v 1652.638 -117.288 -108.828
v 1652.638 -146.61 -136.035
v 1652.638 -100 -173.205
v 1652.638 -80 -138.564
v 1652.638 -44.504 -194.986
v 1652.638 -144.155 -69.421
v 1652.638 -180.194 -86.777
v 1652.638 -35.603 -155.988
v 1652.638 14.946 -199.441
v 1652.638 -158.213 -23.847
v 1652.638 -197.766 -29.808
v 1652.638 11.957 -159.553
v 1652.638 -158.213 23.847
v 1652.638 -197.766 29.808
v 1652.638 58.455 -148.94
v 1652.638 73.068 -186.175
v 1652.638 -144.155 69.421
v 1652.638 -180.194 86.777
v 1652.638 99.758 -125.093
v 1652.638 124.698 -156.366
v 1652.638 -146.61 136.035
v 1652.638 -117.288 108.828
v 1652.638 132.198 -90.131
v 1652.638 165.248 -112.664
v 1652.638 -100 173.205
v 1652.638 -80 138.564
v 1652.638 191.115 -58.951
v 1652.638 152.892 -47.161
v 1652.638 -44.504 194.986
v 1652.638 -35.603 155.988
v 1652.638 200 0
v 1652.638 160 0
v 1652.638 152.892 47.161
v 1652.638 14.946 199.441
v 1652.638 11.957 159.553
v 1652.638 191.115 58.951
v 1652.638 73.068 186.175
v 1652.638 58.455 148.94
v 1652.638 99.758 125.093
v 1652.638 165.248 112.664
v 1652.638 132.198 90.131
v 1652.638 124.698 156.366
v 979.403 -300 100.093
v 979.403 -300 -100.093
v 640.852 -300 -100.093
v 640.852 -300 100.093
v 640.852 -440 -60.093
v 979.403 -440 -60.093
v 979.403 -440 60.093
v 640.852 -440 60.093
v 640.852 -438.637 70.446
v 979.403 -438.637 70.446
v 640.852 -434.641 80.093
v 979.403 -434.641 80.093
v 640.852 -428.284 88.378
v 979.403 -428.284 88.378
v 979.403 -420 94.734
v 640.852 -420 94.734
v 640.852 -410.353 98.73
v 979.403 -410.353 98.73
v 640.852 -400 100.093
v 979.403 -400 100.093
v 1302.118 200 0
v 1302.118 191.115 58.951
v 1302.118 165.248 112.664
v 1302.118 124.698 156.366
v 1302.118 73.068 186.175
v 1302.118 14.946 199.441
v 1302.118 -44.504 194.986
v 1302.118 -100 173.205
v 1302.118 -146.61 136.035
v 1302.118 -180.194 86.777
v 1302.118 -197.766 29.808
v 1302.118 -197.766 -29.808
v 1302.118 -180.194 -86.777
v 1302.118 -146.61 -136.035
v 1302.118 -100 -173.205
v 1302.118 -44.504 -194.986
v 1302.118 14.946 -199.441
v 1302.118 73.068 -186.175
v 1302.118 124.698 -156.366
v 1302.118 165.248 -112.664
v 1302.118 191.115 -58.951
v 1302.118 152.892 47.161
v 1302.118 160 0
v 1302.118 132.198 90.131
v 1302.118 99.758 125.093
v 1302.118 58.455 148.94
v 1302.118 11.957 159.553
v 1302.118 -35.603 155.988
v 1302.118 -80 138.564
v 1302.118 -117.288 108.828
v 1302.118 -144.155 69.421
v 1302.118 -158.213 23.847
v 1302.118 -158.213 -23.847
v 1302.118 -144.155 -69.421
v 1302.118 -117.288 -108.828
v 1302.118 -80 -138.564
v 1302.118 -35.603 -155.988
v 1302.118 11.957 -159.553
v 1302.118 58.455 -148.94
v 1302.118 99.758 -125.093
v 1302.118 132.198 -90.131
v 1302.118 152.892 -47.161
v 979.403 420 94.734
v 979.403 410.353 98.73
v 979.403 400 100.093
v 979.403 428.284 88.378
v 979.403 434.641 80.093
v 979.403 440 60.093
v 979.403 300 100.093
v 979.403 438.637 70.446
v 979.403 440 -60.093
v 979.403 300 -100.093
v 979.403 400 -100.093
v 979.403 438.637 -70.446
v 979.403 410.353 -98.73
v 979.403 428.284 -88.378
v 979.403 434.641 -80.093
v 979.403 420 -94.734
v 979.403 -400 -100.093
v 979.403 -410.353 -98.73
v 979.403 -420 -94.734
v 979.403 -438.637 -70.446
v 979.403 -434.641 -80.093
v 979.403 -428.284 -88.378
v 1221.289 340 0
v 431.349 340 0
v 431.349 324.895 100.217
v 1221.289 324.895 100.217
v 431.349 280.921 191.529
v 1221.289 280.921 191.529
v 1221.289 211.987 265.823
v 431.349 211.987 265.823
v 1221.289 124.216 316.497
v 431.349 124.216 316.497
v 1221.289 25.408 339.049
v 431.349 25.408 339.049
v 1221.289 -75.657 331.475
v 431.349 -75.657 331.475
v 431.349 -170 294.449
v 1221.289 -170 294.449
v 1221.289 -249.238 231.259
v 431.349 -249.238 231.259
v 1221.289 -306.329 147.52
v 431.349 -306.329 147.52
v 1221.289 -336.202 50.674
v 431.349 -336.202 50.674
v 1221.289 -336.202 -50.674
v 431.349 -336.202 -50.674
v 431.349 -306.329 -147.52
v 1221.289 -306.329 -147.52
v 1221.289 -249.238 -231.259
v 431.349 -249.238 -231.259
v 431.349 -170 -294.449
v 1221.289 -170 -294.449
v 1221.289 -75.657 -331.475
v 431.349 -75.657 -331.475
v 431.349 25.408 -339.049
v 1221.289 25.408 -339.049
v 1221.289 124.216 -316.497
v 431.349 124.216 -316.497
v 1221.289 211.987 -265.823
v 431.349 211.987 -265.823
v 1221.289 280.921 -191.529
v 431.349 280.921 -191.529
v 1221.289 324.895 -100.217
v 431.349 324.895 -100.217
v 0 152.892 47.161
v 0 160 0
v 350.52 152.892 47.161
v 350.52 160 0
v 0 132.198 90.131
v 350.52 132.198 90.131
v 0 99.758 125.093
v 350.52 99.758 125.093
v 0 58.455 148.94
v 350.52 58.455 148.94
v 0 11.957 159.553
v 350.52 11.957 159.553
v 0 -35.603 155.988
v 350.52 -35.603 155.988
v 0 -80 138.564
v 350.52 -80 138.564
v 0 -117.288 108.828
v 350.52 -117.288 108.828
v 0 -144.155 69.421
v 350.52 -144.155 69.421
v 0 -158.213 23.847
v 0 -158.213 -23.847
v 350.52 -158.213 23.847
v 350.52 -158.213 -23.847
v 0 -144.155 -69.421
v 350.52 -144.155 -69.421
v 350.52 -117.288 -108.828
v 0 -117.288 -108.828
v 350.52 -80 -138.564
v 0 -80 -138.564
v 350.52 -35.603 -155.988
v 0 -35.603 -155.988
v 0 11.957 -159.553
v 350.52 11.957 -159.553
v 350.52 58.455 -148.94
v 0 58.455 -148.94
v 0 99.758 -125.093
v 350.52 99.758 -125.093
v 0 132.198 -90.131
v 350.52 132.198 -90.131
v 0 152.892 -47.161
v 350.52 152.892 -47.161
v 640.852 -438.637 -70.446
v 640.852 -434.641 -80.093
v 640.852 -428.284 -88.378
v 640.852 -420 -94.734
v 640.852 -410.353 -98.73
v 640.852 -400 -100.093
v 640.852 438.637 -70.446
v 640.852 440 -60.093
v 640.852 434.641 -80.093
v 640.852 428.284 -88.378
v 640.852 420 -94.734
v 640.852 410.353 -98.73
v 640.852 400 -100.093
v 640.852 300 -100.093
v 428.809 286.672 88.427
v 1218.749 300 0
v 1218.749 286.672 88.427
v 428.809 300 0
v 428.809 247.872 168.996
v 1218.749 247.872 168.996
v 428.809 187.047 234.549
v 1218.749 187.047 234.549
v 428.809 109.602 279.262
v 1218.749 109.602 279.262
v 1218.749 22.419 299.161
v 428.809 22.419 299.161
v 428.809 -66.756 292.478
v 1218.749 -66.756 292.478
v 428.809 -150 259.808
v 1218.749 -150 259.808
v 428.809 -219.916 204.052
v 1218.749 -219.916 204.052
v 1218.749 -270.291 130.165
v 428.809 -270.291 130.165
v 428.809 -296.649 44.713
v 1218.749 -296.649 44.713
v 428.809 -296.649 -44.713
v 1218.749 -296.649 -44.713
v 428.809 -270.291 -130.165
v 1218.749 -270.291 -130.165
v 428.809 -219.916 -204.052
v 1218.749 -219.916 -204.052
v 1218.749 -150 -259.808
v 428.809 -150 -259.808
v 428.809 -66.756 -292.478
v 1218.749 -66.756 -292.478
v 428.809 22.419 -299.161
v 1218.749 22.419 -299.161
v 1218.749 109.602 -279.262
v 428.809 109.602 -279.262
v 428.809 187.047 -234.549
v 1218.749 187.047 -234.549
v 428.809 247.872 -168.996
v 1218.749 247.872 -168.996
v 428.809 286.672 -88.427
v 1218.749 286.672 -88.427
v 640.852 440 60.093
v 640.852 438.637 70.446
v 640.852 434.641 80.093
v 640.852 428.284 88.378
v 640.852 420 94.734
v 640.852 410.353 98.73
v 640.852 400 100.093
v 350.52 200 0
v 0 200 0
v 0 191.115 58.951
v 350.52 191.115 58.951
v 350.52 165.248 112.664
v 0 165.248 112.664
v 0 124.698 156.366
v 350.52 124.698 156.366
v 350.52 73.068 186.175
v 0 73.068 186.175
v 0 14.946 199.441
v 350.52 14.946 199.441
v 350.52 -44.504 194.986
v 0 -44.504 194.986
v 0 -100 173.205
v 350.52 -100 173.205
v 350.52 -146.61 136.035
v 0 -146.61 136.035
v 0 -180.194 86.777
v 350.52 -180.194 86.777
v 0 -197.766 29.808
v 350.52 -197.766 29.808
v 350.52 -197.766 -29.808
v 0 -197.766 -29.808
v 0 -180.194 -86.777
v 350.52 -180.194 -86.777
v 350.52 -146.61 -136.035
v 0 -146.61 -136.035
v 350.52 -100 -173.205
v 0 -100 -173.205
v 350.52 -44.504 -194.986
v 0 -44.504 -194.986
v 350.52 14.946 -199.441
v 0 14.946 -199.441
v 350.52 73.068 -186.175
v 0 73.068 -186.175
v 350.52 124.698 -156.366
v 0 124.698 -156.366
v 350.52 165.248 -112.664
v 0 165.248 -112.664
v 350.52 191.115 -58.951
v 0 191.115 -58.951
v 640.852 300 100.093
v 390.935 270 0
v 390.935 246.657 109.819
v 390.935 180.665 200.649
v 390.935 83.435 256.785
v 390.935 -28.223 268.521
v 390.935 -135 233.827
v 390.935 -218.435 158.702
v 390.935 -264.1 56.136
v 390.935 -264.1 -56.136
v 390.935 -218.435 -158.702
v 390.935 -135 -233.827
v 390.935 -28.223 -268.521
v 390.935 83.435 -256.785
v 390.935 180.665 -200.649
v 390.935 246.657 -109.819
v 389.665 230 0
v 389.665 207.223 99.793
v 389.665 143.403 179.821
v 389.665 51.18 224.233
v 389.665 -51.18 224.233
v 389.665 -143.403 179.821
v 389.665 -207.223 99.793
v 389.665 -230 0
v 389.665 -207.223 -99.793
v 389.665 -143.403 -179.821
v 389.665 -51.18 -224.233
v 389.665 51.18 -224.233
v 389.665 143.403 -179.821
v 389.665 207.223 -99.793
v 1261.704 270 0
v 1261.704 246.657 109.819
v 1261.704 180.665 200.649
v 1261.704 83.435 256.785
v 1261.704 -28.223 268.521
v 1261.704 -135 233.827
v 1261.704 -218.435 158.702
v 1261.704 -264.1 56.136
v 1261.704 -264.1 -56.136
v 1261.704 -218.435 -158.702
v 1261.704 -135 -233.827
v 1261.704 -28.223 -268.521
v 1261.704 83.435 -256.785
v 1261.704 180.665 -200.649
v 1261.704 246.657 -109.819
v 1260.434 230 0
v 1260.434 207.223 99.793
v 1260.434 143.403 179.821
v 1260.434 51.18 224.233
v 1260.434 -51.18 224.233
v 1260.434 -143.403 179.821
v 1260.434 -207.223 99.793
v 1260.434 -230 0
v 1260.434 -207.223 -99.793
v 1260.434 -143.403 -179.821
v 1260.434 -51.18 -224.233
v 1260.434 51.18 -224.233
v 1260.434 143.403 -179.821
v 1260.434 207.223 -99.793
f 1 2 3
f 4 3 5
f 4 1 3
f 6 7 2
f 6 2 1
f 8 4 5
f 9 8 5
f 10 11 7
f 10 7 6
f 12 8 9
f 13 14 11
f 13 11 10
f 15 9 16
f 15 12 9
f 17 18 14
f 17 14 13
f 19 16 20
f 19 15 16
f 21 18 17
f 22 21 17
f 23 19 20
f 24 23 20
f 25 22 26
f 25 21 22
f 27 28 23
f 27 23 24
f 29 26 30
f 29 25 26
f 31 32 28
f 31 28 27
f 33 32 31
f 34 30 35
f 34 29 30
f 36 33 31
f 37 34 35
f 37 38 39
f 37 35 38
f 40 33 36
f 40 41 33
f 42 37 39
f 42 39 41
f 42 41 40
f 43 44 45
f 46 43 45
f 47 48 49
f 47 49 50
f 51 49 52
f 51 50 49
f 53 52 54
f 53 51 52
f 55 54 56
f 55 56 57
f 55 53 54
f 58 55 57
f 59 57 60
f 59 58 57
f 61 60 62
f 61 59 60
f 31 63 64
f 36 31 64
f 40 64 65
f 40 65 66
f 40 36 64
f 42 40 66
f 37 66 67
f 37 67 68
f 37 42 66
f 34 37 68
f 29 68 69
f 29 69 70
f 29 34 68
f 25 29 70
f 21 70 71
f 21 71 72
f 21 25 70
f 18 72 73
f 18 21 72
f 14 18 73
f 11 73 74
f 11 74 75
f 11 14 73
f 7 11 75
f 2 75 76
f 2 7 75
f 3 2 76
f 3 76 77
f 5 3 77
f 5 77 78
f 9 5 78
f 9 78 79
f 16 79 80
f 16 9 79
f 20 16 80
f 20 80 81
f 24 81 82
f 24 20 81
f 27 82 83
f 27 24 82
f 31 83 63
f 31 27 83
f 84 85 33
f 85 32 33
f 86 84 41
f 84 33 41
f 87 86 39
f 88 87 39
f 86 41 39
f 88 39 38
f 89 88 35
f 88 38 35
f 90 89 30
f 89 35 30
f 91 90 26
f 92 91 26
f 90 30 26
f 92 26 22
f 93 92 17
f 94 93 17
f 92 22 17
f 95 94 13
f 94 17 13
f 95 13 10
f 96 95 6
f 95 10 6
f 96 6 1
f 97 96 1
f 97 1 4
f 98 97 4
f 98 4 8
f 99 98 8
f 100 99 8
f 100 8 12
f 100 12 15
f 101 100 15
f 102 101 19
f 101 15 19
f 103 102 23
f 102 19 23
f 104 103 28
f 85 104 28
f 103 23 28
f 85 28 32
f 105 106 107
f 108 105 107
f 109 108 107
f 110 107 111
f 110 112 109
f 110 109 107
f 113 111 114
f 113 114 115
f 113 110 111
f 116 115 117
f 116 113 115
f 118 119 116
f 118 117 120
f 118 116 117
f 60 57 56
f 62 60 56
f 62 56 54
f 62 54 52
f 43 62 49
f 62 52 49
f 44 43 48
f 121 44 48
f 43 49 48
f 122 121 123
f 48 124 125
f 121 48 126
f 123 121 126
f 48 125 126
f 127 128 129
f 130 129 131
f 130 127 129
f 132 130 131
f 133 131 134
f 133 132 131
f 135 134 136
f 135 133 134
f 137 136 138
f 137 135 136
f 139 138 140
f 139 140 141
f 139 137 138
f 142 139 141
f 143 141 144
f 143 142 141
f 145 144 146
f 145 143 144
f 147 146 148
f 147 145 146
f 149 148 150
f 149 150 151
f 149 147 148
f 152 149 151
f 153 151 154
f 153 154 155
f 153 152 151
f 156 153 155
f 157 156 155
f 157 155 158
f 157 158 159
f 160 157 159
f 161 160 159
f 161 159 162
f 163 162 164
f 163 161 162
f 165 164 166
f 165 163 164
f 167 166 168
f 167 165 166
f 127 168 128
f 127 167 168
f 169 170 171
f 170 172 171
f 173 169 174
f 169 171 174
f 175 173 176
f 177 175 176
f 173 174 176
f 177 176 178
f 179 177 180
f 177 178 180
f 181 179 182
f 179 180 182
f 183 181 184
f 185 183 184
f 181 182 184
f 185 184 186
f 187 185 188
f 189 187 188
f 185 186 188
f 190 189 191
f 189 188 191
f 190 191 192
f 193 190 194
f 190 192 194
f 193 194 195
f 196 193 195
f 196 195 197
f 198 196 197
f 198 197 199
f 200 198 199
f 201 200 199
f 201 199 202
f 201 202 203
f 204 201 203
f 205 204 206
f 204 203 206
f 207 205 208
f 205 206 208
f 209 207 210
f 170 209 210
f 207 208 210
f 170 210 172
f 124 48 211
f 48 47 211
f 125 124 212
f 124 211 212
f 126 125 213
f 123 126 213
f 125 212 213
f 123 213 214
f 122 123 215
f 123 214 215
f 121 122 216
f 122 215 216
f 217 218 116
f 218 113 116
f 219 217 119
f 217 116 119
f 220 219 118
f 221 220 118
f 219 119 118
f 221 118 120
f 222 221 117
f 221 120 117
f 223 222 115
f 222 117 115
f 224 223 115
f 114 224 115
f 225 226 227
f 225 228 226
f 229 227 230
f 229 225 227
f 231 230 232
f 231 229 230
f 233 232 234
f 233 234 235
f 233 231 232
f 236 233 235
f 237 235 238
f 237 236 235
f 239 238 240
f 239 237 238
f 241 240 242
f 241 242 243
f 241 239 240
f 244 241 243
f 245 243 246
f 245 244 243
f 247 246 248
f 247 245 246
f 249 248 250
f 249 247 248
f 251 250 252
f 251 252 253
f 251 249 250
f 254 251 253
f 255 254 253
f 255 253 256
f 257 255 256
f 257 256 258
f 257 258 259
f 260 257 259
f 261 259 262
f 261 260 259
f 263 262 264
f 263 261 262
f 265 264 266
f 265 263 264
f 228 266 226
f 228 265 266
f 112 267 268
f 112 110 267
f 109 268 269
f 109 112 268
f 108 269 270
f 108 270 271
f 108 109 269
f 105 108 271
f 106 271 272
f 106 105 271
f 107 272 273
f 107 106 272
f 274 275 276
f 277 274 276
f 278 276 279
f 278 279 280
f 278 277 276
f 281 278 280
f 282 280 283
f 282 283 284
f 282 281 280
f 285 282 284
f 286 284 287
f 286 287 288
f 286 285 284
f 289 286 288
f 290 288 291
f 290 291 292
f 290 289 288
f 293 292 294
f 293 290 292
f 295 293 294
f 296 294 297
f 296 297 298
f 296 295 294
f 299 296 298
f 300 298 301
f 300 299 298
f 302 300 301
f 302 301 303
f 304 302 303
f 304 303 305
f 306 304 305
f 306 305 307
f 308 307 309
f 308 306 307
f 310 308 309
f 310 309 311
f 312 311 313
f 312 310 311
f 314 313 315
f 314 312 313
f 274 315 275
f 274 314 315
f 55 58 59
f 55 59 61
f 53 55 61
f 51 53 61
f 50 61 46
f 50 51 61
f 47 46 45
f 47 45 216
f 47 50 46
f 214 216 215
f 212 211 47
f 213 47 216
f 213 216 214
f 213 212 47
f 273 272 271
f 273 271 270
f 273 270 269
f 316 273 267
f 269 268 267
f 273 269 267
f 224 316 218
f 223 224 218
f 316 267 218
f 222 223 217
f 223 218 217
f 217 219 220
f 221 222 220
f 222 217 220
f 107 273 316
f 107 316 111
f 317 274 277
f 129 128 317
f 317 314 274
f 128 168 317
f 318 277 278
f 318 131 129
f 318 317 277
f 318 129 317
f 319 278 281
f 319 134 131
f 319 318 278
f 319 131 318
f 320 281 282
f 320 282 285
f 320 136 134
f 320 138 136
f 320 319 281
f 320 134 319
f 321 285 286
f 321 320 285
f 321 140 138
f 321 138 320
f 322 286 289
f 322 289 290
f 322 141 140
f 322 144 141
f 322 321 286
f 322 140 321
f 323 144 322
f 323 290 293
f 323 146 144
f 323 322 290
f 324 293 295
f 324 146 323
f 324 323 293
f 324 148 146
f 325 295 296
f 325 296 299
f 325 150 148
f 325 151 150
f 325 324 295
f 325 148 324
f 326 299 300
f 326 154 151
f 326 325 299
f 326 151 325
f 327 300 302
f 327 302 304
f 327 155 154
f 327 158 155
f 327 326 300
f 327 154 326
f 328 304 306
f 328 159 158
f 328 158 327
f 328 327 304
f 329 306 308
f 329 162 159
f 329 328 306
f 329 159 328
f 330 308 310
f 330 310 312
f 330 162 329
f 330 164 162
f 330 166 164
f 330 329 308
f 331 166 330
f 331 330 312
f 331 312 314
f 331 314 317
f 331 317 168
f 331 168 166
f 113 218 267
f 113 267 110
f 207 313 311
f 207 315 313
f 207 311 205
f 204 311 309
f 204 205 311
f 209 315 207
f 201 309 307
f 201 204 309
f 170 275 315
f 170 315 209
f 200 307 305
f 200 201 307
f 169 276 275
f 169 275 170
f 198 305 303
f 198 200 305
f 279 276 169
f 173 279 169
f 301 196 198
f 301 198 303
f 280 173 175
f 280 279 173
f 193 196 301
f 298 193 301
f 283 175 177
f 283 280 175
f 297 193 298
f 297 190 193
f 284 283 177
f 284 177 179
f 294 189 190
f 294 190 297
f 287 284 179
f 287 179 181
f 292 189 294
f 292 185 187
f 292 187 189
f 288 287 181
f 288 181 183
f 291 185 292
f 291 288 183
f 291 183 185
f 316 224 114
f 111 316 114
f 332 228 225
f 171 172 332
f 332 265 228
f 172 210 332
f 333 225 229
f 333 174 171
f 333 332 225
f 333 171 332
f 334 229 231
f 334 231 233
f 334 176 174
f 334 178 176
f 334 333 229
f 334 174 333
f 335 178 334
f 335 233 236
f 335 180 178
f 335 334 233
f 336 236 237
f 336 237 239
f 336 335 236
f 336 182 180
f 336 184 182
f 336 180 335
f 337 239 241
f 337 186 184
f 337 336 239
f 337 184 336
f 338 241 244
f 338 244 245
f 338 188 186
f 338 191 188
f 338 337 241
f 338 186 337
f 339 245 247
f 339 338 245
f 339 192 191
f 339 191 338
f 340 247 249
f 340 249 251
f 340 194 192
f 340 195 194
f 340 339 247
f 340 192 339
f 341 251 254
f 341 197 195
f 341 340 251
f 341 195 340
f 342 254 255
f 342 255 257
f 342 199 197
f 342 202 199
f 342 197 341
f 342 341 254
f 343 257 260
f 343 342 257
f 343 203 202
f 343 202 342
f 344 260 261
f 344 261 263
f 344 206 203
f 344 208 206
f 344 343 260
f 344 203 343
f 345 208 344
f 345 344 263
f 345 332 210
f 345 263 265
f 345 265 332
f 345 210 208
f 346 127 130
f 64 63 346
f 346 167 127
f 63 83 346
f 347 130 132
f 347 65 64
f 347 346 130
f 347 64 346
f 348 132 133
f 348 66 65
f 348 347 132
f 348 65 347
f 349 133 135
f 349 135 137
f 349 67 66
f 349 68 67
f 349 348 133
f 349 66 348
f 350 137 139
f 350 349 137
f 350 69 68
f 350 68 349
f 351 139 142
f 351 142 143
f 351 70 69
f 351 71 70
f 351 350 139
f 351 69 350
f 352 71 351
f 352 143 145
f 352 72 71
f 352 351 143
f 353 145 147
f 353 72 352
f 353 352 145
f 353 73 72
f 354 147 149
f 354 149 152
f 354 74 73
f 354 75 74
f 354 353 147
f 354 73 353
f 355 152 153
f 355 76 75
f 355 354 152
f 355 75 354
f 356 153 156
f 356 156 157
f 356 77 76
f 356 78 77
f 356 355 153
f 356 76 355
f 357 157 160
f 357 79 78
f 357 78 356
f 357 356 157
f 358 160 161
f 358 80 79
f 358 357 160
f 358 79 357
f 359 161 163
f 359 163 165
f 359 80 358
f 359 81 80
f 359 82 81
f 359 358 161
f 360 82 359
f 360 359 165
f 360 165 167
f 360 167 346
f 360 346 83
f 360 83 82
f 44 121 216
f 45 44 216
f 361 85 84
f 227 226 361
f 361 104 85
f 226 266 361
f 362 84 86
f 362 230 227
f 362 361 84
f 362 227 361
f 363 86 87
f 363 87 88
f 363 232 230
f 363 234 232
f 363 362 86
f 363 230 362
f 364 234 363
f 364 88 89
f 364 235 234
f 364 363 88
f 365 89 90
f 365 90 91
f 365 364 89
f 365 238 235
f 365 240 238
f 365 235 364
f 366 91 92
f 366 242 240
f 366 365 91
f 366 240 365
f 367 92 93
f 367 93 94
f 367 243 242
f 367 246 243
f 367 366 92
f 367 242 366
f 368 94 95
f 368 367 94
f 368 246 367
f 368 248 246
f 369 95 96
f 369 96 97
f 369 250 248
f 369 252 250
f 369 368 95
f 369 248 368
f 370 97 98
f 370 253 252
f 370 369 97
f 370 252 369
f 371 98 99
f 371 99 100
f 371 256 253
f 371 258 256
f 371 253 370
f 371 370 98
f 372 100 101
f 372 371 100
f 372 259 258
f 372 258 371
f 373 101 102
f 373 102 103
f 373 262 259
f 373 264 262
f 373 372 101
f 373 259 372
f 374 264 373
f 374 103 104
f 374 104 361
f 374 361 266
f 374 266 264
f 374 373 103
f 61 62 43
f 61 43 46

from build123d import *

# Parameters (mm, degrees)
SKETCH3_W                = 338.550765942
SKETCH3_H                = 200.186539862
BOSS_EXTRUDE1_DEPTH      = 100
BOSS_EXTRUDE1_DEPTH_BACK = 40
FILLET1_R                = 40
SKETCH5_W                = 338.550765942
SKETCH5_H                = 200.186539862
BOSS_EXTRUDE2_DEPTH      = 99.999999898
BOSS_EXTRUDE2_DEPTH_BACK = 40
FILLET2_R                = 40


with BuildPart() as part:
    # Sketch1 → Revolve1 (revolve)
    with BuildSketch(Plane.XY):
        Polygon((0, 159.99999878), (0, 199.99999878), (350.52, 199.99999878), (431.34903734, 339.99999818), (1221.28903734, 339.99999818), (1302.11807468, 199.99999878), (1652.63807468, 199.99999878), (1652.63807468, 159.99999878), (1626.618760092, 159.99999878), (1302.11807468, 159.99999878), (1218.74903734, 299.99999818), (428.80903734, 299.99999818), (350.52, 159.99999878), (39.855878474, 159.99999878), align=None)
    revolve(axis=Axis((0, 0, 0), (1, 0, 0)))


with BuildPart() as body_2:
    # Sketch3 → Boss-Extrude1 (new body, two sides)
    with BuildSketch(Plane(origin=(0, 339.999999958, 0), x_dir=(1, 0, 0), z_dir=(0, 1, 0))) as boss_extrude1_sk:
        with Locations((810.127478969, 0)):
            Rectangle(SKETCH3_W, SKETCH3_H)
    extrude(amount=BOSS_EXTRUDE1_DEPTH)
    extrude(boss_extrude1_sk.sketch, amount=-BOSS_EXTRUDE1_DEPTH_BACK)

    # Fillet1
    fillet1_edges = [body_2.edges().sort_by_distance(p)[0] for p in [
        (810.127478969, 439.999999958, -100.093269931),
        (810.127478969, 439.999999958, 100.093269931),
    ]]
    fillet(fillet1_edges, radius=FILLET1_R)


with BuildPart() as body_3:
    # Sketch5 → Boss-Extrude2 (new body, two sides)
    with BuildSketch(Plane(origin=(0, -339.999999958, 0), x_dir=(-1, 0, 0), z_dir=(0, -1, 0))) as boss_extrude2_sk:
        with Locations((-810.127478969, 0)):
            Rectangle(SKETCH5_W, SKETCH5_H)
    extrude(amount=BOSS_EXTRUDE2_DEPTH)
    extrude(boss_extrude2_sk.sketch, amount=-BOSS_EXTRUDE2_DEPTH_BACK)

    # Fillet2
    fillet2_edges = [body_3.edges().sort_by_distance(p)[0] for p in [
        (810.127478969, -439.999999856, 100.093269931),
        (810.127478969, -439.999999856, -100.093269931),
    ]]
    fillet(fillet2_edges, radius=FILLET2_R)


solid = Compound([part.part, body_2.part, body_3.part])
